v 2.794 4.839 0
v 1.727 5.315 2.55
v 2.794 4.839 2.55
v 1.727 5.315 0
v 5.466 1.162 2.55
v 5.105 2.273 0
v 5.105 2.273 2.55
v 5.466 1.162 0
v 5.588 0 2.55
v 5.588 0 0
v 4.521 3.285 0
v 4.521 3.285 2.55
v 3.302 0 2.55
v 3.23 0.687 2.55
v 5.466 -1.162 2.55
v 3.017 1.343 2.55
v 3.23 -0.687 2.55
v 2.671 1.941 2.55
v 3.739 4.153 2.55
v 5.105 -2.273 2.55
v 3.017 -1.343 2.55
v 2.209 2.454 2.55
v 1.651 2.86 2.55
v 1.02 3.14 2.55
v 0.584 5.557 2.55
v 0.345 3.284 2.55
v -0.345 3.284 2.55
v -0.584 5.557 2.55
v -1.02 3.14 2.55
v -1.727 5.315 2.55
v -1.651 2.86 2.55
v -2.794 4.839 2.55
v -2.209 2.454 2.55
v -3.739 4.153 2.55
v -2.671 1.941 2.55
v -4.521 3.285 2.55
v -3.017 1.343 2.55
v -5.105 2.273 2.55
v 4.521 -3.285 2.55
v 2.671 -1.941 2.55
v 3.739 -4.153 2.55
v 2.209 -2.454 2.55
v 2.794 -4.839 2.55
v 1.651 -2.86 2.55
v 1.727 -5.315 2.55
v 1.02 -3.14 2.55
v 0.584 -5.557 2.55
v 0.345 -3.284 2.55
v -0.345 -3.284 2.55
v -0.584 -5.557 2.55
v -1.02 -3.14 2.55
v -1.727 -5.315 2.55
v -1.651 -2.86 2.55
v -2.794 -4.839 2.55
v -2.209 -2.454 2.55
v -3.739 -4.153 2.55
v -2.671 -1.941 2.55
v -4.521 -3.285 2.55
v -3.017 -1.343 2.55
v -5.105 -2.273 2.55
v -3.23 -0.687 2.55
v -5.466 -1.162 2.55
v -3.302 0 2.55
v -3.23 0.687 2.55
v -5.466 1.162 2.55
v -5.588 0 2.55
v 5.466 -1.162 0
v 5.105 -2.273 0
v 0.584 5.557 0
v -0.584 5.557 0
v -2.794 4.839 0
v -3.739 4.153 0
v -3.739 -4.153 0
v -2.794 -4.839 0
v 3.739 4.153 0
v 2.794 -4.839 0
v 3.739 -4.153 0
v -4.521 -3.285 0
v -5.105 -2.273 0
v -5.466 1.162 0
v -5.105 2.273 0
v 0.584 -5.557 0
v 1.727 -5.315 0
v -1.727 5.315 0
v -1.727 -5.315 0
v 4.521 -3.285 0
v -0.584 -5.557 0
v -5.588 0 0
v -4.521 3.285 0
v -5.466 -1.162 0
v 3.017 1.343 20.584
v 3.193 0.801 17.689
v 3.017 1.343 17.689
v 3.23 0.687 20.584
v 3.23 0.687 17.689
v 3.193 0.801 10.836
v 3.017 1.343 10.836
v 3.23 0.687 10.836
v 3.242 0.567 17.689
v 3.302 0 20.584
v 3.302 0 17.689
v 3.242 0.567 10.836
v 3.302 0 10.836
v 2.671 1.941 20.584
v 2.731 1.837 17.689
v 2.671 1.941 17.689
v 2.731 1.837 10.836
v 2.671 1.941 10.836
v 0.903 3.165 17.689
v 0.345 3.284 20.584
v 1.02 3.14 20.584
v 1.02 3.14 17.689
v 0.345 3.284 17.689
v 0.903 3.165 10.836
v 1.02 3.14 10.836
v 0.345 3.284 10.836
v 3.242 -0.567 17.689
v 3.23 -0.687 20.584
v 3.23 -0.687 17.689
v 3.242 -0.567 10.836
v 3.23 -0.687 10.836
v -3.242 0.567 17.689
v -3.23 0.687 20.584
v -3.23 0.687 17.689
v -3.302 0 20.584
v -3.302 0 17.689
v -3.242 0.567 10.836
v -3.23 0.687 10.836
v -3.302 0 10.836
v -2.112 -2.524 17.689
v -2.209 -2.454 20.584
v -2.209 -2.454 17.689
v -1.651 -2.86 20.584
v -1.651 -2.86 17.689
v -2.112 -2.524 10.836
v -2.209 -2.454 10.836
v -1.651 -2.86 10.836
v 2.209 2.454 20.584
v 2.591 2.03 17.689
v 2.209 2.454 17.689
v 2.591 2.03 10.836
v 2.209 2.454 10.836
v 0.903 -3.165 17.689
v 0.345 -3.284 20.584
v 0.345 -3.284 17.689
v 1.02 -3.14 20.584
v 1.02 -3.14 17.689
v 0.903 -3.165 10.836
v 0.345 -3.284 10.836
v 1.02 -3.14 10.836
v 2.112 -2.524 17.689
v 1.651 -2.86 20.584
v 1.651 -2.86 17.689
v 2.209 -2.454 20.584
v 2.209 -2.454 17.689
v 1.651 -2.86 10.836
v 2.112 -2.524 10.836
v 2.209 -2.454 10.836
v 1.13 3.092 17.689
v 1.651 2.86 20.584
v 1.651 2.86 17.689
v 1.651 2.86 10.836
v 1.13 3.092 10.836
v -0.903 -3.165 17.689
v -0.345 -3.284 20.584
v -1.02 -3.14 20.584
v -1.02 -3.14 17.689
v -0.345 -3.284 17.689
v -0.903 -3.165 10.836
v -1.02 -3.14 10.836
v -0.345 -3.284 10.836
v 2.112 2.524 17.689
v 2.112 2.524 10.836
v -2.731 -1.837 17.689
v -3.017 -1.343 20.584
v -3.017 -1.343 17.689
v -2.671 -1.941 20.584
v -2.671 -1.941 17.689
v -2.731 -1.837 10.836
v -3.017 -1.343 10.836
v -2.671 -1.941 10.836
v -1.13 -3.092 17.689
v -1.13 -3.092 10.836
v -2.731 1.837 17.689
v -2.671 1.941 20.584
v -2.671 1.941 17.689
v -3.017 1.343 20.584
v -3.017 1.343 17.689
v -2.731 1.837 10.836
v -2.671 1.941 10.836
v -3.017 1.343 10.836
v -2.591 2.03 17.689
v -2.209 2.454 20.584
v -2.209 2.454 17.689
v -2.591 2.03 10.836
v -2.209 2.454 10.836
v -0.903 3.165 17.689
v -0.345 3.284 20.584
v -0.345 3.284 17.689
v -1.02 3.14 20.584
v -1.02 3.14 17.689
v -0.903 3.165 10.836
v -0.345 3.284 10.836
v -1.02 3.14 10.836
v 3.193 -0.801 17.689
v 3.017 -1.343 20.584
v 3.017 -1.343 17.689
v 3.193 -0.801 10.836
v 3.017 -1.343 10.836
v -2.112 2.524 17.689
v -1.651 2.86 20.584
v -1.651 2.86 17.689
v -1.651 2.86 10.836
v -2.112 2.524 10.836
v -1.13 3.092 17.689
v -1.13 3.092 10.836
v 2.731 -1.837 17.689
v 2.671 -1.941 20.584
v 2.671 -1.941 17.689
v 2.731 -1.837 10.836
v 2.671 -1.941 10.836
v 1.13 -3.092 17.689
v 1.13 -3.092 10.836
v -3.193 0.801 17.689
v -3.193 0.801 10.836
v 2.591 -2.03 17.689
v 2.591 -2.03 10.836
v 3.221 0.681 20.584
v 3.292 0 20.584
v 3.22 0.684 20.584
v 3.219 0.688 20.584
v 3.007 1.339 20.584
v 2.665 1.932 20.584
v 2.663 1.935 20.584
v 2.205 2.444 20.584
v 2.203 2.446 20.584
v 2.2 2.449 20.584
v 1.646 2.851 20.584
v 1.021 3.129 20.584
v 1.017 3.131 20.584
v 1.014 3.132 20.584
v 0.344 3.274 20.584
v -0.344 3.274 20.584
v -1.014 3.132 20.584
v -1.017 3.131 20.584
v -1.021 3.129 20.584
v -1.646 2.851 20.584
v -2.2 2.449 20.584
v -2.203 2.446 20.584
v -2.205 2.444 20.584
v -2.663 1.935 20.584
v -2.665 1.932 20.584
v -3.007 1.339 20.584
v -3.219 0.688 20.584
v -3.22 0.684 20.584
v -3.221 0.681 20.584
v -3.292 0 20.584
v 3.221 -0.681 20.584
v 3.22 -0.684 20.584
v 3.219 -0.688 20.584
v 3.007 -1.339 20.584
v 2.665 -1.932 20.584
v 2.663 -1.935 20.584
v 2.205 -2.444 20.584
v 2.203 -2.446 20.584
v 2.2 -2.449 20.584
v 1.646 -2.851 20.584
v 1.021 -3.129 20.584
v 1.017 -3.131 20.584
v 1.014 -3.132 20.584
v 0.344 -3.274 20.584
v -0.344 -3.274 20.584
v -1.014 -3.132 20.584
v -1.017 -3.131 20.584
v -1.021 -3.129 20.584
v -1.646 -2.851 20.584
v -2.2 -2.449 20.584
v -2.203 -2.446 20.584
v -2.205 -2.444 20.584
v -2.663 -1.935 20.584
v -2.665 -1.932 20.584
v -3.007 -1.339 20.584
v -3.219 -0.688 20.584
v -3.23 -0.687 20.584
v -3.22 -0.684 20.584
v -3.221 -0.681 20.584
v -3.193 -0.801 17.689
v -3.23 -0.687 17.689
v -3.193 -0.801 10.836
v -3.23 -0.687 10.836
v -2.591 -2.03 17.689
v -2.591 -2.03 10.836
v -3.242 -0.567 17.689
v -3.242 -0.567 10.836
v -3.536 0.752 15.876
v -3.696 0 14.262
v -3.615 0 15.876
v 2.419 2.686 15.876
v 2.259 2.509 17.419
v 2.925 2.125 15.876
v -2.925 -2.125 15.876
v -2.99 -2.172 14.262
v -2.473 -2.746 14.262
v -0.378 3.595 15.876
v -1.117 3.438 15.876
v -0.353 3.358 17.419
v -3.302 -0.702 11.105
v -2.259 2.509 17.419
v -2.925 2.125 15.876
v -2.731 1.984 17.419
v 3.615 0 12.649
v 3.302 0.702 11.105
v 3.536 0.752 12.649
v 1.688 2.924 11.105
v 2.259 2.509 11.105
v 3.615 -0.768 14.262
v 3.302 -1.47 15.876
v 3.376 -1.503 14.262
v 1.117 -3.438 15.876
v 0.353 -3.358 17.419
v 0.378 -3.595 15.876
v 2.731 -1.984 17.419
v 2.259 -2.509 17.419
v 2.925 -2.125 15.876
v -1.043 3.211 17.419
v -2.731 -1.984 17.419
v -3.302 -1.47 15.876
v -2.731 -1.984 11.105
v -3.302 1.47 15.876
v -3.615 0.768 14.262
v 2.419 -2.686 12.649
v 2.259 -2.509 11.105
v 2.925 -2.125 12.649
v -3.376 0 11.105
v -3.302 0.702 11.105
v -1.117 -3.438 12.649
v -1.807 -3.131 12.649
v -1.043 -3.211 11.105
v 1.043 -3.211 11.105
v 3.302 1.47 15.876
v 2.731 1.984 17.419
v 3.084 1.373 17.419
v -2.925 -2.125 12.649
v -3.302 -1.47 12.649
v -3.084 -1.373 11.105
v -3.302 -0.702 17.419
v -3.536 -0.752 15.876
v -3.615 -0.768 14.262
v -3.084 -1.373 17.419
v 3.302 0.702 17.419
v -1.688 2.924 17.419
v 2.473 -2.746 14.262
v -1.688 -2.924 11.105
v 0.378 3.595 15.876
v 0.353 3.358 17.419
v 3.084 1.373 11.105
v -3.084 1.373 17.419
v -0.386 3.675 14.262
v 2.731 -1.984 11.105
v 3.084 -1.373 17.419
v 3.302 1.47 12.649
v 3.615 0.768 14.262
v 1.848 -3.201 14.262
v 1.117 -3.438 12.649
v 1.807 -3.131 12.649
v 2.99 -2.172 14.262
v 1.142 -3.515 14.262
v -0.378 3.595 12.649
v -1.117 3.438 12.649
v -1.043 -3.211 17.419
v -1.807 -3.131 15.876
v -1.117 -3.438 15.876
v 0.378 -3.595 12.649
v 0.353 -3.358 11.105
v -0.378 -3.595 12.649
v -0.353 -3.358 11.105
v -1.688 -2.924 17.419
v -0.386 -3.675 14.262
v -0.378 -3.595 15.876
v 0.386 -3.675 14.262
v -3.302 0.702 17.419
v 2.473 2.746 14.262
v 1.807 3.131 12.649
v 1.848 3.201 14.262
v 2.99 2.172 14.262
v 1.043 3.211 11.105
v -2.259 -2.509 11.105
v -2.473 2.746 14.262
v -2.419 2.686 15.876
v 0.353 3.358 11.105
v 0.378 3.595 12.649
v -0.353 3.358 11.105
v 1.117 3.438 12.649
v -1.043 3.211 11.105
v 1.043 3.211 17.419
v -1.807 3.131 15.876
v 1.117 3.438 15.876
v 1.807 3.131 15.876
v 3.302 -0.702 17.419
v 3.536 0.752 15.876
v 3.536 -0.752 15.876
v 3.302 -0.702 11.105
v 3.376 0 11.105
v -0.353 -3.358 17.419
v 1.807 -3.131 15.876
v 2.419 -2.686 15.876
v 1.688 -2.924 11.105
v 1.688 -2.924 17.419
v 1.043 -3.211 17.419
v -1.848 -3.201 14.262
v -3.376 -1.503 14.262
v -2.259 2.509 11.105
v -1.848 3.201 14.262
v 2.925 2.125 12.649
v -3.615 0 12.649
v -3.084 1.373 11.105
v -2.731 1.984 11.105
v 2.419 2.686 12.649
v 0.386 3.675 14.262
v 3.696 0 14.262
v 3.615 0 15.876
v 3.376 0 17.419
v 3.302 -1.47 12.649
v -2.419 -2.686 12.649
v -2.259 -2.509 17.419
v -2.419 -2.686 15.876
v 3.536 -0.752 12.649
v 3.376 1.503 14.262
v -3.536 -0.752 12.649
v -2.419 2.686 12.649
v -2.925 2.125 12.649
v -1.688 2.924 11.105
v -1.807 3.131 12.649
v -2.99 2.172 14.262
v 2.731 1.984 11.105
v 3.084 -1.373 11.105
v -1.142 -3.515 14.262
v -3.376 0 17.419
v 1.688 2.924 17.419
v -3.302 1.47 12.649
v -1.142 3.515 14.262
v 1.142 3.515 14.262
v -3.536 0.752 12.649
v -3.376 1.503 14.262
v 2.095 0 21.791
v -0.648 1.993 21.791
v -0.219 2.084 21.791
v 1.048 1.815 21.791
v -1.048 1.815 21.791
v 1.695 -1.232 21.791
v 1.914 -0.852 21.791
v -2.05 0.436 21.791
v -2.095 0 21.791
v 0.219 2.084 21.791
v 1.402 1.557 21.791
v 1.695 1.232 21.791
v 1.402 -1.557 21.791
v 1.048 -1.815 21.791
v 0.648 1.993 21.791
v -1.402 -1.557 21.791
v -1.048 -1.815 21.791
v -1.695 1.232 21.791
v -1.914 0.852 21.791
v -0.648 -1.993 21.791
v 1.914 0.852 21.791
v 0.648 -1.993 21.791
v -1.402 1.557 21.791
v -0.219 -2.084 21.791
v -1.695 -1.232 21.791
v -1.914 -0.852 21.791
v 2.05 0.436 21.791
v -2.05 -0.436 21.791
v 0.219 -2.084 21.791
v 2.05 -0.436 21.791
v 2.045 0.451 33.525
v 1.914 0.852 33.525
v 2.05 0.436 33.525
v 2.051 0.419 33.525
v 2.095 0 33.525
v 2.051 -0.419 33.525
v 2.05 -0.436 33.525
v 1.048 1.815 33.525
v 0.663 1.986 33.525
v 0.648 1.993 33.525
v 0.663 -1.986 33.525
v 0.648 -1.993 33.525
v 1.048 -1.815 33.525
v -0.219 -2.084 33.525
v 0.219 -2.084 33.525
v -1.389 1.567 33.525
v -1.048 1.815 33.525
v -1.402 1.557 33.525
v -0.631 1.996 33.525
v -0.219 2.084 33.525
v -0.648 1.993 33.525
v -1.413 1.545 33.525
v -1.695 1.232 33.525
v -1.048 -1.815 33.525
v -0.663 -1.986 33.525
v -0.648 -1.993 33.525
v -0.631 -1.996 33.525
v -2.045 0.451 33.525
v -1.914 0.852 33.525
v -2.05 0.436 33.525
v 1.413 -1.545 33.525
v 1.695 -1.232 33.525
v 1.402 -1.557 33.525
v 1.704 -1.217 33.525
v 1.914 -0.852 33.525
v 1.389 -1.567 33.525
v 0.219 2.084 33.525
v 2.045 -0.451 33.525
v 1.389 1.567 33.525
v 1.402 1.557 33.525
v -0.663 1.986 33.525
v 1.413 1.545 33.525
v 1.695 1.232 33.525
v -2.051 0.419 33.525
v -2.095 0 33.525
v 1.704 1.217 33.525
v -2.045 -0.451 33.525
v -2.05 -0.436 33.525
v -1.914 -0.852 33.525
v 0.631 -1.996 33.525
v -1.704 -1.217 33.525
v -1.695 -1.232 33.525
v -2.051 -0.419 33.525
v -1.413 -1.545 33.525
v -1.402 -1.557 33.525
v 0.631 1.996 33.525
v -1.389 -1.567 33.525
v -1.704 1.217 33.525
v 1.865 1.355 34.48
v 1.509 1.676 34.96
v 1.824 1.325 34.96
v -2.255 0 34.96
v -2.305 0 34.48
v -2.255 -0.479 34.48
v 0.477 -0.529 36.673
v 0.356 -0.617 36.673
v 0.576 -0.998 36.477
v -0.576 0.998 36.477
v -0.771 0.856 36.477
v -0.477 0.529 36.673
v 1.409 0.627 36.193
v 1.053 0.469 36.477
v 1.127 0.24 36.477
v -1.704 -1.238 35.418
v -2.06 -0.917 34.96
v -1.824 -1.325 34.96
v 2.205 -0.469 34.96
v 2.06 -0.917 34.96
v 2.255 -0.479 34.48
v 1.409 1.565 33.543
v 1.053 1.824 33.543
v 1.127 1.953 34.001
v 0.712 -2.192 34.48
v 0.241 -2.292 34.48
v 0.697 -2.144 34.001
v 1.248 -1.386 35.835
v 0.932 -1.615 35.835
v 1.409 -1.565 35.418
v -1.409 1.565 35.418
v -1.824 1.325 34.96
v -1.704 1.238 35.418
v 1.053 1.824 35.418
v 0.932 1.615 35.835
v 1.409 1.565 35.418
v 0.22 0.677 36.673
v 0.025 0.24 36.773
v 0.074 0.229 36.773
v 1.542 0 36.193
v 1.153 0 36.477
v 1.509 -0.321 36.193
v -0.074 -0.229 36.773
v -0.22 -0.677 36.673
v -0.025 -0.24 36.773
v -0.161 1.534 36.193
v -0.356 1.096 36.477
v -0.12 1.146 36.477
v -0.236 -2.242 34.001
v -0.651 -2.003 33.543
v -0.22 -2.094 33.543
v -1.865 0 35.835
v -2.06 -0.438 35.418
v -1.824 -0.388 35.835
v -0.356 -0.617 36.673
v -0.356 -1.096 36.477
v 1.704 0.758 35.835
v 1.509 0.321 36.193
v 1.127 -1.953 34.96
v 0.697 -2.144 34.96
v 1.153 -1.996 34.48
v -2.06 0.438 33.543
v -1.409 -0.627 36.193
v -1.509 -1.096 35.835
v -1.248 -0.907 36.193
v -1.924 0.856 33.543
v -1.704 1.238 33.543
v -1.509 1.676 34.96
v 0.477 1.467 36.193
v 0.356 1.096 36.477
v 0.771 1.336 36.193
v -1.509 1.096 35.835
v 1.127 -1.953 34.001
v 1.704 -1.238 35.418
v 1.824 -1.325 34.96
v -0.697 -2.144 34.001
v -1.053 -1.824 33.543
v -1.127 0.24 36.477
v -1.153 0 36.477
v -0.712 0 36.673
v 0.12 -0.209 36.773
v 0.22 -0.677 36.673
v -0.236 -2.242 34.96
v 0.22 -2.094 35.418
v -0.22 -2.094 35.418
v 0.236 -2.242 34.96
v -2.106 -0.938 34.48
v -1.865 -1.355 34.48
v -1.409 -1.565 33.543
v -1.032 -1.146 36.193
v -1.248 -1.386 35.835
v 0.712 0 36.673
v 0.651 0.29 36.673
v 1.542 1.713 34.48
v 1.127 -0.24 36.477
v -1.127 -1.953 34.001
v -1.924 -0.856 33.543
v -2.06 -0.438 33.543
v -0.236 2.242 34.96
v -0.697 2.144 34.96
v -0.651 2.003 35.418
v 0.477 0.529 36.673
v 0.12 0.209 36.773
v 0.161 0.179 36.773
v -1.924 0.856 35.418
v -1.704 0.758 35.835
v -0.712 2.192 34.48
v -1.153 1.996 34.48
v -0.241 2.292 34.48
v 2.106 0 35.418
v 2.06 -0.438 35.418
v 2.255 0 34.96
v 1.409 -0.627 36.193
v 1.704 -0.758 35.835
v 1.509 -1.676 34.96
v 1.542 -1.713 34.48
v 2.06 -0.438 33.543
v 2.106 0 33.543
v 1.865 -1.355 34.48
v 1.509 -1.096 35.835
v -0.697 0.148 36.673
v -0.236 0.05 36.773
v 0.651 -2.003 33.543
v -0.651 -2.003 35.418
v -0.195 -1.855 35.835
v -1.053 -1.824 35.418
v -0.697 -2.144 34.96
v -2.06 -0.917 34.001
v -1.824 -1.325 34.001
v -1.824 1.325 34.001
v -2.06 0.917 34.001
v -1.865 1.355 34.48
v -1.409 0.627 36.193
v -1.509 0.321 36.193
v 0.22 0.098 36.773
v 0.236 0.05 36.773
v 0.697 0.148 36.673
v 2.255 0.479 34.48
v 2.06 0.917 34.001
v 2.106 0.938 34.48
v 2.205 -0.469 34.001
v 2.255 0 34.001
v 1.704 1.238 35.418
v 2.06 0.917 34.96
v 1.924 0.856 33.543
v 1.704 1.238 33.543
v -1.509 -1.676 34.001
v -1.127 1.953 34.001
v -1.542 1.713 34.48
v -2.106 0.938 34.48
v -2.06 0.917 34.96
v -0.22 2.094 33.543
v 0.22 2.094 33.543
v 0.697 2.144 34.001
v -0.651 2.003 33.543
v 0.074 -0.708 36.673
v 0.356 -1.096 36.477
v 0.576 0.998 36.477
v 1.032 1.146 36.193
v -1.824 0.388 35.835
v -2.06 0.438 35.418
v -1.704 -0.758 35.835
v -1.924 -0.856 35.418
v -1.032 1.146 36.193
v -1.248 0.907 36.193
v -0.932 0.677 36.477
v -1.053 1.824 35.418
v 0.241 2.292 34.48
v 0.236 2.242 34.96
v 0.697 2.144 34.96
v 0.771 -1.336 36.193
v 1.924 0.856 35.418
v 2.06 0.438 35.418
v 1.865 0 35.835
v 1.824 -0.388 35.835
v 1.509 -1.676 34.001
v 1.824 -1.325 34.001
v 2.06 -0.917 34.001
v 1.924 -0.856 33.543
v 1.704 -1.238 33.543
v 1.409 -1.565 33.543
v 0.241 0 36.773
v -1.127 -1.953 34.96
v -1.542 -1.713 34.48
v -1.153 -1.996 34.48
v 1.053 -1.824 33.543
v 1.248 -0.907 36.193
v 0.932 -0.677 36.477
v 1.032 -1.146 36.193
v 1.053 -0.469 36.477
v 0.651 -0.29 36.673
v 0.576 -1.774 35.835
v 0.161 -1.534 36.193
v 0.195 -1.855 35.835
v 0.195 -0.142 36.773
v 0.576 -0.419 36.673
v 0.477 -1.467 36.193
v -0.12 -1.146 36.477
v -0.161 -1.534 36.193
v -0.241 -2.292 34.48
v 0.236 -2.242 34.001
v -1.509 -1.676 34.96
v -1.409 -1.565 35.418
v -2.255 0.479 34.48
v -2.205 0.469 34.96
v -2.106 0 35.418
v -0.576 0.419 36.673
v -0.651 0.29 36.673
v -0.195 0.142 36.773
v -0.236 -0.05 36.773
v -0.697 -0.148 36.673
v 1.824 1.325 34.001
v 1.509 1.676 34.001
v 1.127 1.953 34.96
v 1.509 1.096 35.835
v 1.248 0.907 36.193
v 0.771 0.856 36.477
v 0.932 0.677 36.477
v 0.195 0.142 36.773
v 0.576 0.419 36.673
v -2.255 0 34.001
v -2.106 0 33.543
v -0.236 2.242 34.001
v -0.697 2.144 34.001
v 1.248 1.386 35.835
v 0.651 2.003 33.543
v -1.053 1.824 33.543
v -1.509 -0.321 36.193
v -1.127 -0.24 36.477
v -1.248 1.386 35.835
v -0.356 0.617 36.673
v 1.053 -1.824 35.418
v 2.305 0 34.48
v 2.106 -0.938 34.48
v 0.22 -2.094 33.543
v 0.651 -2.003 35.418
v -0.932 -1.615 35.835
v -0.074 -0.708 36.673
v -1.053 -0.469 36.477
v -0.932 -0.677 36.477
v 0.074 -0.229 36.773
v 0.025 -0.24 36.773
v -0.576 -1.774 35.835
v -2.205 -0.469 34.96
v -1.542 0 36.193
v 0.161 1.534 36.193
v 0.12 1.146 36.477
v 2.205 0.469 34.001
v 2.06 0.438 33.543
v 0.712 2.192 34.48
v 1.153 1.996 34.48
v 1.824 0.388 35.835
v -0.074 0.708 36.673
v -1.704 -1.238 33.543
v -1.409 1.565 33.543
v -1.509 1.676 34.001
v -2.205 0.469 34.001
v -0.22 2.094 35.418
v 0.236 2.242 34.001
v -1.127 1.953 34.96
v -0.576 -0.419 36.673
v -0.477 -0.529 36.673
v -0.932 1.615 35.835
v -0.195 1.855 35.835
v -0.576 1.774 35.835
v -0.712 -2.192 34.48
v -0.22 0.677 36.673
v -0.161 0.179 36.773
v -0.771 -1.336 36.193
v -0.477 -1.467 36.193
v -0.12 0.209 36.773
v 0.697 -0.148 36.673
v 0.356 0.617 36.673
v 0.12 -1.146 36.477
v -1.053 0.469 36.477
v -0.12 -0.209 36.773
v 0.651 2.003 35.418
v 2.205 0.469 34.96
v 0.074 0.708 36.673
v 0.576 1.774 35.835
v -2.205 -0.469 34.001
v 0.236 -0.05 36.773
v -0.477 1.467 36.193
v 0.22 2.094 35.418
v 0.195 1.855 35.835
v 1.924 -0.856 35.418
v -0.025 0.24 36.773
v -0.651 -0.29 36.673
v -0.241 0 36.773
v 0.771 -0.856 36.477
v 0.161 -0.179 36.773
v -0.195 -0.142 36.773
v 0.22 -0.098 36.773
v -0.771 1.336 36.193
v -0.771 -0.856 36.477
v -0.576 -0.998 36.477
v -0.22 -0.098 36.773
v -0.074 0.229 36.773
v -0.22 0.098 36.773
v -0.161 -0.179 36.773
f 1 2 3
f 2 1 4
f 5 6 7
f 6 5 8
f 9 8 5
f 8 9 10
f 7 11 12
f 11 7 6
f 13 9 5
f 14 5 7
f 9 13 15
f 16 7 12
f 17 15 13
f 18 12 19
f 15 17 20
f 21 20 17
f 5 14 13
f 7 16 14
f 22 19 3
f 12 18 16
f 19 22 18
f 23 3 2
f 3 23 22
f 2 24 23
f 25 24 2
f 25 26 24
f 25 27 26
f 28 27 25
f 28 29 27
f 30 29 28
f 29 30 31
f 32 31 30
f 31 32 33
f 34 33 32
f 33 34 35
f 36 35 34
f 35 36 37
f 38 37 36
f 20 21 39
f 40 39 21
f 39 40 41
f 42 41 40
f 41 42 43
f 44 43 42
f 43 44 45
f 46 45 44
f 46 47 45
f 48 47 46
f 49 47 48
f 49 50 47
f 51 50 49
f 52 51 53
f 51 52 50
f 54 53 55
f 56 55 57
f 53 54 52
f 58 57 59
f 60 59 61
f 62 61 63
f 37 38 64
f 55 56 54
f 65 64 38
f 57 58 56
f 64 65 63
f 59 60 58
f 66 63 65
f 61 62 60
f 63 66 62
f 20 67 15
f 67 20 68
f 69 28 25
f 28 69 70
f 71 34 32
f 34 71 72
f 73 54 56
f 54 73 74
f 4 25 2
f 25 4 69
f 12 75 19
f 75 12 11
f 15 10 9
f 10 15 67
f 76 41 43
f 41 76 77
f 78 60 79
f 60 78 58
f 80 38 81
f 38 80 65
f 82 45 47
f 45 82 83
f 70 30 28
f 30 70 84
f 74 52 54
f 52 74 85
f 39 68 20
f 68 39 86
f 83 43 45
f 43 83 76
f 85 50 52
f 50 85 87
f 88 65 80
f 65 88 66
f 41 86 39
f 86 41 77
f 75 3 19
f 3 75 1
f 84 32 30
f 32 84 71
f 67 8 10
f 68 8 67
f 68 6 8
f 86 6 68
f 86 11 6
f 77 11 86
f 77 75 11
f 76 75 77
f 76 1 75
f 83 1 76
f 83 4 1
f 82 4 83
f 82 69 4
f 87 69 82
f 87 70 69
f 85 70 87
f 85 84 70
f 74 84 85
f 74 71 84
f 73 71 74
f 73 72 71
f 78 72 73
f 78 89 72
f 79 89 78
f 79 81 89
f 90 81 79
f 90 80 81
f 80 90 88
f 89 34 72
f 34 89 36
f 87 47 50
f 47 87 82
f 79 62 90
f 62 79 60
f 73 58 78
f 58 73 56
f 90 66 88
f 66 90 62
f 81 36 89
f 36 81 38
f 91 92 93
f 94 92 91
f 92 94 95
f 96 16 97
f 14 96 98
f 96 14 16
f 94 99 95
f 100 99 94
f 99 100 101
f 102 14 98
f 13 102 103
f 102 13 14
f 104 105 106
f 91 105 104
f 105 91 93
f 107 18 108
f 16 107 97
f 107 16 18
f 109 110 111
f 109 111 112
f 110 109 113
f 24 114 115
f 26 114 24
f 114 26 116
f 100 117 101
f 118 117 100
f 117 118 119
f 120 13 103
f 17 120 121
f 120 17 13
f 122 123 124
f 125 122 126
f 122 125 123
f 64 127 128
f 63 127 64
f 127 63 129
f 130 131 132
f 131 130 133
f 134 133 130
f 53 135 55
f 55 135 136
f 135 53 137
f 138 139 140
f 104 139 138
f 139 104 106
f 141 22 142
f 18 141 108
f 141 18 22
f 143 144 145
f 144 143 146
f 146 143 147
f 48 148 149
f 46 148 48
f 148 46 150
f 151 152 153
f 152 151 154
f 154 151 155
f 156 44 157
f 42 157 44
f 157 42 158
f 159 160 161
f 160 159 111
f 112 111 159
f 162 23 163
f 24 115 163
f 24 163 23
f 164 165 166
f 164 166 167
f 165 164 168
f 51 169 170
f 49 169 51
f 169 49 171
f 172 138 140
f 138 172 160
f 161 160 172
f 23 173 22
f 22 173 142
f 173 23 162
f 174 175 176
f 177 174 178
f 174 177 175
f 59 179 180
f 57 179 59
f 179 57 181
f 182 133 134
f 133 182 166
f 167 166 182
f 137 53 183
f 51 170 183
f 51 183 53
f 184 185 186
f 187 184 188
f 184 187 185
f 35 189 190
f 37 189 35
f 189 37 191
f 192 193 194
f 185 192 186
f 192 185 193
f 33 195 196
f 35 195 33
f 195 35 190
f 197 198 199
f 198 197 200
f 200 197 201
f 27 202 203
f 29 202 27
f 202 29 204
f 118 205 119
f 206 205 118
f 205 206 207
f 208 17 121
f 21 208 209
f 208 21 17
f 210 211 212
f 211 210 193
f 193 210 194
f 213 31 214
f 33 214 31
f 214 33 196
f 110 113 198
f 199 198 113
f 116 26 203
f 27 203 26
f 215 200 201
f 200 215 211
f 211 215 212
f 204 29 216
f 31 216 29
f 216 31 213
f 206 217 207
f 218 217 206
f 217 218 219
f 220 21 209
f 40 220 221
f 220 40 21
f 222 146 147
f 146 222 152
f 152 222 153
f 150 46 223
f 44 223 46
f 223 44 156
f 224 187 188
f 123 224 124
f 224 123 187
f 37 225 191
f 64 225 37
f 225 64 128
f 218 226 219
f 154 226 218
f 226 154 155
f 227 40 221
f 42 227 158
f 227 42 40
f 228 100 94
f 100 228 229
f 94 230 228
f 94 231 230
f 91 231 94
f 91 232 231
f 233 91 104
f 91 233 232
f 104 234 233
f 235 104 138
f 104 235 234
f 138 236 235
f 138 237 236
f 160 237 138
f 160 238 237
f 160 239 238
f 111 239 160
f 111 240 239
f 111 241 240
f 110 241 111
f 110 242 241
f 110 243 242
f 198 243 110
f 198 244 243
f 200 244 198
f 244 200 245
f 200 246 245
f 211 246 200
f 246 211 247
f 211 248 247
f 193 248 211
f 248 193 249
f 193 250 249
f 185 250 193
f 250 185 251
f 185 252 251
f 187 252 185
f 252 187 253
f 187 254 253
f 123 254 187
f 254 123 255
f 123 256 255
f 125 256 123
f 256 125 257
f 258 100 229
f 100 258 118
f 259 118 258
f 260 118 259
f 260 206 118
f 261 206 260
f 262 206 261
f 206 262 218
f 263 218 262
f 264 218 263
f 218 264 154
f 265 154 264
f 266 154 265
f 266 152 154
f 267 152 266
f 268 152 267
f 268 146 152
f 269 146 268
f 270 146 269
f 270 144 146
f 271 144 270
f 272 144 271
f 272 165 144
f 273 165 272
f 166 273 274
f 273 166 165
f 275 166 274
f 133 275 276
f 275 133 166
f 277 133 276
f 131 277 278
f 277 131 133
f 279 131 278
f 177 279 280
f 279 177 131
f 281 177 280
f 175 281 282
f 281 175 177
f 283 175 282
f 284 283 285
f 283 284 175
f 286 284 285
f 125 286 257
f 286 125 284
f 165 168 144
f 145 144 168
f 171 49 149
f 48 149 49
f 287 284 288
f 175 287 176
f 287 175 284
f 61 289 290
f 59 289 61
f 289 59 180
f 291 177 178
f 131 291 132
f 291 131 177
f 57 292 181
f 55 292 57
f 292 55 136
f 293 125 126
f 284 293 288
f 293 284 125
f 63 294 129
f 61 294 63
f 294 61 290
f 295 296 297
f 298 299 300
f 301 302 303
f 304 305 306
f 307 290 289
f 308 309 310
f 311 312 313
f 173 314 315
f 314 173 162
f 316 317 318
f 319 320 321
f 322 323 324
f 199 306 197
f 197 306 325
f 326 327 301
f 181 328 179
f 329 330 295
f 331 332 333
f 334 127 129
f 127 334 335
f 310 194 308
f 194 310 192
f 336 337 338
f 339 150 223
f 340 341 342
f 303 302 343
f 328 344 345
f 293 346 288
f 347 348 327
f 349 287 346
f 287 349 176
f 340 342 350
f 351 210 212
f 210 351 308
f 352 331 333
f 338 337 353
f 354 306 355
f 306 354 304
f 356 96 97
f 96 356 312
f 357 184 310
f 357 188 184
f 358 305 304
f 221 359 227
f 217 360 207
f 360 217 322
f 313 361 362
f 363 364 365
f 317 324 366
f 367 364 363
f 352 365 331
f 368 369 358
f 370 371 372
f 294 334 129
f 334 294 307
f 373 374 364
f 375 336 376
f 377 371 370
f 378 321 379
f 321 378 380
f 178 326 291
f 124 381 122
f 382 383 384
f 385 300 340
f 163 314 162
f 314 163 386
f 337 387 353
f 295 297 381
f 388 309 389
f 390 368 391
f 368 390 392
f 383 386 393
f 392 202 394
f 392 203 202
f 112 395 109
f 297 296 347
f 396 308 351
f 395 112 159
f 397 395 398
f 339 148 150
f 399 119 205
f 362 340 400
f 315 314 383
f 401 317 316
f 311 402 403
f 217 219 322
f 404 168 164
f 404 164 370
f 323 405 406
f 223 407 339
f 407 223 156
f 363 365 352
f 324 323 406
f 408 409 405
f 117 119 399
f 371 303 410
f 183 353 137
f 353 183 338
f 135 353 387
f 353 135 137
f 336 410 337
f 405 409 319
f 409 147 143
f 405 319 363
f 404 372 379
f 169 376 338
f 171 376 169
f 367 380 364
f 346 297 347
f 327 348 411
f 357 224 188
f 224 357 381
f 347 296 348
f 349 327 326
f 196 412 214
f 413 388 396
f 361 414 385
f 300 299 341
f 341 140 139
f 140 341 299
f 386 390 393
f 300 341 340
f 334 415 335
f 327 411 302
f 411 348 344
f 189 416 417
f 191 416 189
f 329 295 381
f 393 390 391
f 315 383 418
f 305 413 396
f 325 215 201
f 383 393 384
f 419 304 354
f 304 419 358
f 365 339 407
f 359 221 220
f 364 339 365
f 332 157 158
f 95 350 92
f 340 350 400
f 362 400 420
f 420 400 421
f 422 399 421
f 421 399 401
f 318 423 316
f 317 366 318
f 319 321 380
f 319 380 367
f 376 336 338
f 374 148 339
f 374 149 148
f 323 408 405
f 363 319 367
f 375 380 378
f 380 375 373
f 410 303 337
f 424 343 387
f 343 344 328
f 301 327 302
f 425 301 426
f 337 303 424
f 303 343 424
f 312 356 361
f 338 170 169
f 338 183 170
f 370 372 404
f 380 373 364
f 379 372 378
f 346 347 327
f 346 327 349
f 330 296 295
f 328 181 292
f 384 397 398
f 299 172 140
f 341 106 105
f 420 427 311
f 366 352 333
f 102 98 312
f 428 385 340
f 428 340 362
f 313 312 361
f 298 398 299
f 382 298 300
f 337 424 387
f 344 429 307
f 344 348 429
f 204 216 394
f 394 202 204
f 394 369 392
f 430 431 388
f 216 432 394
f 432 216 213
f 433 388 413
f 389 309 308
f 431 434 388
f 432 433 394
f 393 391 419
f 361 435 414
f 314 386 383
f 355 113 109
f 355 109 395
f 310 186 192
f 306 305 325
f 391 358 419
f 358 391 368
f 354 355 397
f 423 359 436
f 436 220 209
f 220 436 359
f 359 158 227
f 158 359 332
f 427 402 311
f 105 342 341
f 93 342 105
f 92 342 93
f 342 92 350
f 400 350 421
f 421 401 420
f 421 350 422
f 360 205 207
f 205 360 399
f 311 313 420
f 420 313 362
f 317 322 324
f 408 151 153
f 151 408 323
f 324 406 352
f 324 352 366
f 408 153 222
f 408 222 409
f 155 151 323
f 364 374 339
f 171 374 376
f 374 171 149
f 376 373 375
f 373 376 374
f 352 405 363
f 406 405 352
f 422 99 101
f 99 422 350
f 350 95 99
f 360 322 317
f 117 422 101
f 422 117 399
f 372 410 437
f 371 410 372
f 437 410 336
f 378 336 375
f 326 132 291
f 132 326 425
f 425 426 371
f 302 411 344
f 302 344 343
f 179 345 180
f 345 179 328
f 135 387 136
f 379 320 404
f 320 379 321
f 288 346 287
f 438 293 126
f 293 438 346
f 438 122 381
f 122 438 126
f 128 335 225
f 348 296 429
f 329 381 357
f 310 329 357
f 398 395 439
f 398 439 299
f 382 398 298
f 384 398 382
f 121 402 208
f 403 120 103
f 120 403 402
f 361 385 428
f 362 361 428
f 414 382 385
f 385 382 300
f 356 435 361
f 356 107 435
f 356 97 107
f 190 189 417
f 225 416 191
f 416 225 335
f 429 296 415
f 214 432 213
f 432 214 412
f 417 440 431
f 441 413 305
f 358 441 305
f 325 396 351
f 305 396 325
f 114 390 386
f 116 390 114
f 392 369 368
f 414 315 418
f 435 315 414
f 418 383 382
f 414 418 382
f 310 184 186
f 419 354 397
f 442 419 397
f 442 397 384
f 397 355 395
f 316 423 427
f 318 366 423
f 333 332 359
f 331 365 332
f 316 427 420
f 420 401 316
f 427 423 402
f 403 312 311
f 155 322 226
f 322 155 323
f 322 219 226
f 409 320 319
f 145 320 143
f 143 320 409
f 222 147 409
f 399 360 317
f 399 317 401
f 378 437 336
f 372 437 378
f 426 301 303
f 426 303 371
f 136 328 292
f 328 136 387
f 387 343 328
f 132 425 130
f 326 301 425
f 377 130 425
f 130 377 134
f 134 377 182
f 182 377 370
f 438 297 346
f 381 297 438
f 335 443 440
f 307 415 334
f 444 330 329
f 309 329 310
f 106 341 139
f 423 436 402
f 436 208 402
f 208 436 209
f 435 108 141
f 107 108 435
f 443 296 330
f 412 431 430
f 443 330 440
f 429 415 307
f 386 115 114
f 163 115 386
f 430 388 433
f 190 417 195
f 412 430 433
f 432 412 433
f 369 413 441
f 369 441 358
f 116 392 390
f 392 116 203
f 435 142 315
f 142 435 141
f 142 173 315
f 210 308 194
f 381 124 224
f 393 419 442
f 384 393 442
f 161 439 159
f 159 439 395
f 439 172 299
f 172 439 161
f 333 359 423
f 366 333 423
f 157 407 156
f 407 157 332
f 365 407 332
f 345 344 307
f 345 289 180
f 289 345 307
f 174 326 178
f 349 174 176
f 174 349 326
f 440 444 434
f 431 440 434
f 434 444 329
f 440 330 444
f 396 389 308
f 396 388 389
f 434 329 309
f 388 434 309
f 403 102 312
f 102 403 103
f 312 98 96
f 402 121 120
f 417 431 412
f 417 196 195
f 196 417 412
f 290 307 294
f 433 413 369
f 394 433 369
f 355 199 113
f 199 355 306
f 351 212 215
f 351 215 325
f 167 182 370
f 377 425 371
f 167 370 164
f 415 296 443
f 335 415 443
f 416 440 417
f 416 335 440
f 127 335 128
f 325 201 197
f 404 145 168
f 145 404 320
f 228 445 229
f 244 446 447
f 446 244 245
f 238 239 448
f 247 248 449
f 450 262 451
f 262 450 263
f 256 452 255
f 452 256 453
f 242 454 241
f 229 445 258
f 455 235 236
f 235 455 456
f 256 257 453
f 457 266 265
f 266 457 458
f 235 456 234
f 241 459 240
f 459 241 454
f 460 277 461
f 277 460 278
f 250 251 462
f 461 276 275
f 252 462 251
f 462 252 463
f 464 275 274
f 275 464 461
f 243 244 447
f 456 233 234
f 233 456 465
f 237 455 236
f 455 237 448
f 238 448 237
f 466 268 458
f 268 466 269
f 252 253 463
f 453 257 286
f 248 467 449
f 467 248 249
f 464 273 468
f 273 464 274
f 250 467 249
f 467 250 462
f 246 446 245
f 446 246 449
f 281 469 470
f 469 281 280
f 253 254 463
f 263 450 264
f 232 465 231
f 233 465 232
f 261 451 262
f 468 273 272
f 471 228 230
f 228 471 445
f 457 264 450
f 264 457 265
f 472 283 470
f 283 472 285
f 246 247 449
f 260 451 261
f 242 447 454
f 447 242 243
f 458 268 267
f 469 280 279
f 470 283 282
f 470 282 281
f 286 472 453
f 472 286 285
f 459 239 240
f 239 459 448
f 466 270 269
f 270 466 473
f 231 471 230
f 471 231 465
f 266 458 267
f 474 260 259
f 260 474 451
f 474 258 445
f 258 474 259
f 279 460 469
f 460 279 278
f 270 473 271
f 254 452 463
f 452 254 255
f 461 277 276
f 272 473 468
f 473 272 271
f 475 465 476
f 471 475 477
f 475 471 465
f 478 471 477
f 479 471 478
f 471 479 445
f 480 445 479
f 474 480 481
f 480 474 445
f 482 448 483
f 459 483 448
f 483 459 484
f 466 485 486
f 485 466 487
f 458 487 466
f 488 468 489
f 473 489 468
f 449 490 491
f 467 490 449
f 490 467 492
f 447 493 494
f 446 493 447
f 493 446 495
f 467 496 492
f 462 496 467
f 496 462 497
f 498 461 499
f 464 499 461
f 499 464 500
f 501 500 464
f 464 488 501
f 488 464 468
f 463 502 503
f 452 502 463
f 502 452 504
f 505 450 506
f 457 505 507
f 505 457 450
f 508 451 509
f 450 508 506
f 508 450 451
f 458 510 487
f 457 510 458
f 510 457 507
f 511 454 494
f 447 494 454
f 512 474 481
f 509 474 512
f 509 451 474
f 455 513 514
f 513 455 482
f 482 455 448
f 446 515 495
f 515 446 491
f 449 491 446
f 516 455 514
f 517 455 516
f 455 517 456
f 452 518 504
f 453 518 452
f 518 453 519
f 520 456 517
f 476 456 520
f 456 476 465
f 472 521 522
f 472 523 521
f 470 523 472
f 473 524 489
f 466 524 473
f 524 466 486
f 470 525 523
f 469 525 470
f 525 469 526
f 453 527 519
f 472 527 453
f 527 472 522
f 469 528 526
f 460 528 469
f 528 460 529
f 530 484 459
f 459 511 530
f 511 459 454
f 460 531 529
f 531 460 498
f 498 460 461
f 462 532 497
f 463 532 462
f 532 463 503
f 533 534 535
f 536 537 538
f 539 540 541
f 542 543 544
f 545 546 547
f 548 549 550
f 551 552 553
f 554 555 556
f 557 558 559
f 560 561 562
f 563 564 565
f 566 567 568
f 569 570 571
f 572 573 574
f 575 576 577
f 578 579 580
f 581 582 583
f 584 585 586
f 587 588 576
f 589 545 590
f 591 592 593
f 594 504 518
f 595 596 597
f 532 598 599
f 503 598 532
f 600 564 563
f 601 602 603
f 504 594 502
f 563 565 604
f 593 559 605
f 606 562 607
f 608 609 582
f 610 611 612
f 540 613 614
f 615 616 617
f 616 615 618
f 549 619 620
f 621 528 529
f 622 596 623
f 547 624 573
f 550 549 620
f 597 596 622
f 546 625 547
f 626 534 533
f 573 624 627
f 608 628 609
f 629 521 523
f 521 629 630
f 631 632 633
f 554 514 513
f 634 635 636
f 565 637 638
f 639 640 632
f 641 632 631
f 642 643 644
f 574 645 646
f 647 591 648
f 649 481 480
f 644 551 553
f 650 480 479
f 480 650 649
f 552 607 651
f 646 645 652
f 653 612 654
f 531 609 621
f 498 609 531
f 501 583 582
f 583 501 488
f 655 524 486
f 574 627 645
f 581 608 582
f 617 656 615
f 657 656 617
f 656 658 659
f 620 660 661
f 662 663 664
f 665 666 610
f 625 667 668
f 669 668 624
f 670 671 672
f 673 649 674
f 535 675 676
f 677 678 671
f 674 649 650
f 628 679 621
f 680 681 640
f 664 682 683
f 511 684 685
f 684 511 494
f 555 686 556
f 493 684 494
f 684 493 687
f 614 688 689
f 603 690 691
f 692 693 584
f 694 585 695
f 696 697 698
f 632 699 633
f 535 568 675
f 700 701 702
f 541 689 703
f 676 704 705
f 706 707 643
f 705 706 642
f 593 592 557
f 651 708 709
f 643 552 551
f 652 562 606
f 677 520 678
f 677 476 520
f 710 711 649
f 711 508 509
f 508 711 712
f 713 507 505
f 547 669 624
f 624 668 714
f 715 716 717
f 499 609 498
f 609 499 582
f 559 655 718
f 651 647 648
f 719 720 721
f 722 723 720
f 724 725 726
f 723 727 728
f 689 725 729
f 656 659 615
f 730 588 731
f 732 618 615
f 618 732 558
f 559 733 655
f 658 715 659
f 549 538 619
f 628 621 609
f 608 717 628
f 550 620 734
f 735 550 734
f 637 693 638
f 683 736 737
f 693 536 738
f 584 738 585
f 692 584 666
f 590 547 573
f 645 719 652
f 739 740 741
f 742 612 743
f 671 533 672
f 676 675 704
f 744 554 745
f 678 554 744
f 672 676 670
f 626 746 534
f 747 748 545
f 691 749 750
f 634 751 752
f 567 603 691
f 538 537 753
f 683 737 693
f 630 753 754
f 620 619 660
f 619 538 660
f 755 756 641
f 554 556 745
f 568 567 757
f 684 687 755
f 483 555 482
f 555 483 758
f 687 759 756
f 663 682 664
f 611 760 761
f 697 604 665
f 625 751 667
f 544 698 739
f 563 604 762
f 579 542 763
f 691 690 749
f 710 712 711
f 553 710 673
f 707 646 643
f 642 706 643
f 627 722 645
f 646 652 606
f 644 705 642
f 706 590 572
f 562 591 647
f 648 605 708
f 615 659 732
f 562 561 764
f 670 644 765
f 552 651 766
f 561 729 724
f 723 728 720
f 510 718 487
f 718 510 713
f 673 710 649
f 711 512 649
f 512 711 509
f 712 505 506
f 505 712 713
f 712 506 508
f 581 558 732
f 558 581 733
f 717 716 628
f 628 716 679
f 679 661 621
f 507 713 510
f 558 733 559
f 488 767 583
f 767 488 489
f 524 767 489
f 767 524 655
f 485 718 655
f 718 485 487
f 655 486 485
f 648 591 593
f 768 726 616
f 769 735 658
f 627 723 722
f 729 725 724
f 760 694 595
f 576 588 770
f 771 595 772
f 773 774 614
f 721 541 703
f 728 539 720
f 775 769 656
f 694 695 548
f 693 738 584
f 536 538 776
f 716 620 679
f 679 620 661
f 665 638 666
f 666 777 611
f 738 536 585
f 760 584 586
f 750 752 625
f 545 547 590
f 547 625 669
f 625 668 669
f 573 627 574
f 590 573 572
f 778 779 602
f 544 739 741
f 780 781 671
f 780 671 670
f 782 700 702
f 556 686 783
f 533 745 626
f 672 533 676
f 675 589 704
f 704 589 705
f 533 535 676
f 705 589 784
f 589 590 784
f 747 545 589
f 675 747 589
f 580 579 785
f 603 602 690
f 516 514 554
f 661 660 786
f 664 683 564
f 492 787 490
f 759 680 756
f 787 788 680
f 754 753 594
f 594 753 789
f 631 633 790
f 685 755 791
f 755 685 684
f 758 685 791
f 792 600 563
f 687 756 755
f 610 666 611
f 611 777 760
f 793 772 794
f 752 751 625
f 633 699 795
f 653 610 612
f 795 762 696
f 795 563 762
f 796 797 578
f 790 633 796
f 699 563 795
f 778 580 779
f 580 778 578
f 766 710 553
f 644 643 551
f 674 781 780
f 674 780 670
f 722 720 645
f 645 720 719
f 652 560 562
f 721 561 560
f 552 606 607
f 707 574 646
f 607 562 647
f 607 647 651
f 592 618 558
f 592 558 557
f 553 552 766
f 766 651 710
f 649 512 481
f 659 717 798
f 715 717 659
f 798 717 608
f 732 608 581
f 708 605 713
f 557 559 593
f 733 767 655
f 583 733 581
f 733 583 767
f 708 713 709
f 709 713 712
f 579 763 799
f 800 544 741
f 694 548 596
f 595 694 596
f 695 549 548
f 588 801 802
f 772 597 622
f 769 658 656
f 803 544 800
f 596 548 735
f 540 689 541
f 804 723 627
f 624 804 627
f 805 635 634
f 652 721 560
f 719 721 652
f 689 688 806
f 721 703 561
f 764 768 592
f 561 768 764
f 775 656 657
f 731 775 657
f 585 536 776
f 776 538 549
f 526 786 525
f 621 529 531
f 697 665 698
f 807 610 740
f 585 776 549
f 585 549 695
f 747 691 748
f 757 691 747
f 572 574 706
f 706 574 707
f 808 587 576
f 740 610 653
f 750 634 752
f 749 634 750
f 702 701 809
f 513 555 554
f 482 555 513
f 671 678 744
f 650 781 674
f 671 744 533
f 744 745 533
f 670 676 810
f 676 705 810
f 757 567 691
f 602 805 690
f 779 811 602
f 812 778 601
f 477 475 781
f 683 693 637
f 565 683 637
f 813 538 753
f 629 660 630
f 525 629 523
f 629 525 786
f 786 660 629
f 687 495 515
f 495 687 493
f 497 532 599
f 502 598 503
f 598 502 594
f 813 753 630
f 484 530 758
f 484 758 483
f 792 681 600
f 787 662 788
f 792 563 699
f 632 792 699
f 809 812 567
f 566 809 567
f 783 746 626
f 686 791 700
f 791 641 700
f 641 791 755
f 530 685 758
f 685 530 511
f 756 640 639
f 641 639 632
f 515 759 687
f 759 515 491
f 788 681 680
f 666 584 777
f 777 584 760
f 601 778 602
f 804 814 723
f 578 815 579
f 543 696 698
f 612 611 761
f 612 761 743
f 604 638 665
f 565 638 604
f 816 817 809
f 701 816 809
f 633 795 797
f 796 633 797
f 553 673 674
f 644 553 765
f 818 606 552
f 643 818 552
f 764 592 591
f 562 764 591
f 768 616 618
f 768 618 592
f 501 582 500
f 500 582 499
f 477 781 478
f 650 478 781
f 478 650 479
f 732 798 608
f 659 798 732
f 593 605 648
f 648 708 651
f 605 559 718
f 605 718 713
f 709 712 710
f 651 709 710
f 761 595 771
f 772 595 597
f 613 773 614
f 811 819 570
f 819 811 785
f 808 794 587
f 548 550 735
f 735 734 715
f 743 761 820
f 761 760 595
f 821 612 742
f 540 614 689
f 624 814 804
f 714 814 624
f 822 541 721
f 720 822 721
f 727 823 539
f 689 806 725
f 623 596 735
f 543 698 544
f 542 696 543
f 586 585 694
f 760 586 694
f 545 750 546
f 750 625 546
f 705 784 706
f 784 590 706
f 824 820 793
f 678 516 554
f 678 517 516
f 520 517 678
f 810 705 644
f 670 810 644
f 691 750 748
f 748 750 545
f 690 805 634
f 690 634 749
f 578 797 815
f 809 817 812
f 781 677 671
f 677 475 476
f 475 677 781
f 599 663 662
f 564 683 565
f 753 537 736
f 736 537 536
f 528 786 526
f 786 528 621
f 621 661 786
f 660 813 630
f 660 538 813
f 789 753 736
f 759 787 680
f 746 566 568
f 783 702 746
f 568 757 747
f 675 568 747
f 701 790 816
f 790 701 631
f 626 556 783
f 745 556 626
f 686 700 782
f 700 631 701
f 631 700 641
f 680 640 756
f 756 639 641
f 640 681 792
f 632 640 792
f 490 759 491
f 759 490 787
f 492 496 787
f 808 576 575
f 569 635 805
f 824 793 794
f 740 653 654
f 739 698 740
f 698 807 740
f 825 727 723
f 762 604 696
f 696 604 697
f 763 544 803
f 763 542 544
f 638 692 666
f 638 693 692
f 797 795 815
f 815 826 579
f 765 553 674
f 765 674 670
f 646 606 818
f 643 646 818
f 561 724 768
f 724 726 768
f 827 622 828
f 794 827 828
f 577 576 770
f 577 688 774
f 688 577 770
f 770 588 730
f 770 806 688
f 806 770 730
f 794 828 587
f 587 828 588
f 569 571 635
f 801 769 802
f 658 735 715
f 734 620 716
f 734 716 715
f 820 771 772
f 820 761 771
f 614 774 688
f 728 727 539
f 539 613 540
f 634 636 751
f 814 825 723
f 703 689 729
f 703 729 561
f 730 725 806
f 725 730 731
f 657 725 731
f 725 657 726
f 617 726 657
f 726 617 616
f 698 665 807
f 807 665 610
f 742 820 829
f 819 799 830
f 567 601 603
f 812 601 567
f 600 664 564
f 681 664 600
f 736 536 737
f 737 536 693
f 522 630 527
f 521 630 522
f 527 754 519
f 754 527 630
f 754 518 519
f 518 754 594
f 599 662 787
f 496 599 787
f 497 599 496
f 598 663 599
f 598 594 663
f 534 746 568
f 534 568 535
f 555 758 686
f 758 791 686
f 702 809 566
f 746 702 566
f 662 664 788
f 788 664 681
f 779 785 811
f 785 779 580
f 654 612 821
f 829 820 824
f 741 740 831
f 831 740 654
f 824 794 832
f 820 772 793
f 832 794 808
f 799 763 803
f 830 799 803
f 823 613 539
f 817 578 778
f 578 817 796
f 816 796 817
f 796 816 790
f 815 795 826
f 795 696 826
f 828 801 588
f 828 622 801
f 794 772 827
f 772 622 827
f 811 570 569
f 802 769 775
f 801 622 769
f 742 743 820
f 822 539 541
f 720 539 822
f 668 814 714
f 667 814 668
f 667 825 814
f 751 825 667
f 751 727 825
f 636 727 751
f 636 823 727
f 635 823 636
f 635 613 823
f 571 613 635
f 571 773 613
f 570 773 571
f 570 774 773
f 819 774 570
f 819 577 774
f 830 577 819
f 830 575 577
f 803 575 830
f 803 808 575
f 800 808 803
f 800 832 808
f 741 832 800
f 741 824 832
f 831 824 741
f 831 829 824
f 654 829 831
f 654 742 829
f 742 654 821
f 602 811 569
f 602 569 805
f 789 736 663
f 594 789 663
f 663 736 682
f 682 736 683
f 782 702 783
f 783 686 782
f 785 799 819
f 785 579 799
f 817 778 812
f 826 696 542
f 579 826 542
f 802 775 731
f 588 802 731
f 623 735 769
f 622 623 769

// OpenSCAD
// [ Units ]
mm=25.4; //[25.4:Inches, 1:mm]
// [ Top ]
// The diameter of the top, usually has to fit inside some kind of recess
topDiameter=0.44;
topThickness=0.1;
//[ Plug ]
cylDiameter=0.26;
fatDiameter=0.291;
cylLength=0.71;
// [ extension]
smallDiameter=0.165;
smallLength=0.5;

//[ hidden ]
$fn=30;
small=0.01; // a small offset to make sure that the components overlap

union()
{
    // the base
	cylinder(d = topDiameter*mm, h = topThickness*mm+small);
    top1=topThickness*mm;
    
    // the cylinder which is the actual plug
	translate( [0, 0, top1] ) cylinder(d=cylDiameter*mm, h = cylLength*mm+small);
    top2=top1+cylLength*mm;
    
    // the fat part of the plug, shaped like a stretched out sphere
	translate( [0, 0, top2-cylLength*mm*0.35] ) scale([1,1,2.1])sphere(d = fatDiameter*mm);
    
    // the narrowing at a 45 degree angle
    translate( [0, 0, top2 ] ) cylinder(r1=cylDiameter*mm/2, r2=smallDiameter*mm/2, h = (cylDiameter-smallDiameter)*mm/2+small);
    top3=top2+(cylDiameter-smallDiameter)*mm/2;
    
    // the small diameter piece
    translate( [0, 0, top3] ) cylinder(d=smallDiameter*mm, h = smallLength*mm+small);
    top4=top3+smallLength*mm;
    
    // a round end
    translate([0,0,top4]) sphere(d=smallDiameter*mm*1.1);
}
